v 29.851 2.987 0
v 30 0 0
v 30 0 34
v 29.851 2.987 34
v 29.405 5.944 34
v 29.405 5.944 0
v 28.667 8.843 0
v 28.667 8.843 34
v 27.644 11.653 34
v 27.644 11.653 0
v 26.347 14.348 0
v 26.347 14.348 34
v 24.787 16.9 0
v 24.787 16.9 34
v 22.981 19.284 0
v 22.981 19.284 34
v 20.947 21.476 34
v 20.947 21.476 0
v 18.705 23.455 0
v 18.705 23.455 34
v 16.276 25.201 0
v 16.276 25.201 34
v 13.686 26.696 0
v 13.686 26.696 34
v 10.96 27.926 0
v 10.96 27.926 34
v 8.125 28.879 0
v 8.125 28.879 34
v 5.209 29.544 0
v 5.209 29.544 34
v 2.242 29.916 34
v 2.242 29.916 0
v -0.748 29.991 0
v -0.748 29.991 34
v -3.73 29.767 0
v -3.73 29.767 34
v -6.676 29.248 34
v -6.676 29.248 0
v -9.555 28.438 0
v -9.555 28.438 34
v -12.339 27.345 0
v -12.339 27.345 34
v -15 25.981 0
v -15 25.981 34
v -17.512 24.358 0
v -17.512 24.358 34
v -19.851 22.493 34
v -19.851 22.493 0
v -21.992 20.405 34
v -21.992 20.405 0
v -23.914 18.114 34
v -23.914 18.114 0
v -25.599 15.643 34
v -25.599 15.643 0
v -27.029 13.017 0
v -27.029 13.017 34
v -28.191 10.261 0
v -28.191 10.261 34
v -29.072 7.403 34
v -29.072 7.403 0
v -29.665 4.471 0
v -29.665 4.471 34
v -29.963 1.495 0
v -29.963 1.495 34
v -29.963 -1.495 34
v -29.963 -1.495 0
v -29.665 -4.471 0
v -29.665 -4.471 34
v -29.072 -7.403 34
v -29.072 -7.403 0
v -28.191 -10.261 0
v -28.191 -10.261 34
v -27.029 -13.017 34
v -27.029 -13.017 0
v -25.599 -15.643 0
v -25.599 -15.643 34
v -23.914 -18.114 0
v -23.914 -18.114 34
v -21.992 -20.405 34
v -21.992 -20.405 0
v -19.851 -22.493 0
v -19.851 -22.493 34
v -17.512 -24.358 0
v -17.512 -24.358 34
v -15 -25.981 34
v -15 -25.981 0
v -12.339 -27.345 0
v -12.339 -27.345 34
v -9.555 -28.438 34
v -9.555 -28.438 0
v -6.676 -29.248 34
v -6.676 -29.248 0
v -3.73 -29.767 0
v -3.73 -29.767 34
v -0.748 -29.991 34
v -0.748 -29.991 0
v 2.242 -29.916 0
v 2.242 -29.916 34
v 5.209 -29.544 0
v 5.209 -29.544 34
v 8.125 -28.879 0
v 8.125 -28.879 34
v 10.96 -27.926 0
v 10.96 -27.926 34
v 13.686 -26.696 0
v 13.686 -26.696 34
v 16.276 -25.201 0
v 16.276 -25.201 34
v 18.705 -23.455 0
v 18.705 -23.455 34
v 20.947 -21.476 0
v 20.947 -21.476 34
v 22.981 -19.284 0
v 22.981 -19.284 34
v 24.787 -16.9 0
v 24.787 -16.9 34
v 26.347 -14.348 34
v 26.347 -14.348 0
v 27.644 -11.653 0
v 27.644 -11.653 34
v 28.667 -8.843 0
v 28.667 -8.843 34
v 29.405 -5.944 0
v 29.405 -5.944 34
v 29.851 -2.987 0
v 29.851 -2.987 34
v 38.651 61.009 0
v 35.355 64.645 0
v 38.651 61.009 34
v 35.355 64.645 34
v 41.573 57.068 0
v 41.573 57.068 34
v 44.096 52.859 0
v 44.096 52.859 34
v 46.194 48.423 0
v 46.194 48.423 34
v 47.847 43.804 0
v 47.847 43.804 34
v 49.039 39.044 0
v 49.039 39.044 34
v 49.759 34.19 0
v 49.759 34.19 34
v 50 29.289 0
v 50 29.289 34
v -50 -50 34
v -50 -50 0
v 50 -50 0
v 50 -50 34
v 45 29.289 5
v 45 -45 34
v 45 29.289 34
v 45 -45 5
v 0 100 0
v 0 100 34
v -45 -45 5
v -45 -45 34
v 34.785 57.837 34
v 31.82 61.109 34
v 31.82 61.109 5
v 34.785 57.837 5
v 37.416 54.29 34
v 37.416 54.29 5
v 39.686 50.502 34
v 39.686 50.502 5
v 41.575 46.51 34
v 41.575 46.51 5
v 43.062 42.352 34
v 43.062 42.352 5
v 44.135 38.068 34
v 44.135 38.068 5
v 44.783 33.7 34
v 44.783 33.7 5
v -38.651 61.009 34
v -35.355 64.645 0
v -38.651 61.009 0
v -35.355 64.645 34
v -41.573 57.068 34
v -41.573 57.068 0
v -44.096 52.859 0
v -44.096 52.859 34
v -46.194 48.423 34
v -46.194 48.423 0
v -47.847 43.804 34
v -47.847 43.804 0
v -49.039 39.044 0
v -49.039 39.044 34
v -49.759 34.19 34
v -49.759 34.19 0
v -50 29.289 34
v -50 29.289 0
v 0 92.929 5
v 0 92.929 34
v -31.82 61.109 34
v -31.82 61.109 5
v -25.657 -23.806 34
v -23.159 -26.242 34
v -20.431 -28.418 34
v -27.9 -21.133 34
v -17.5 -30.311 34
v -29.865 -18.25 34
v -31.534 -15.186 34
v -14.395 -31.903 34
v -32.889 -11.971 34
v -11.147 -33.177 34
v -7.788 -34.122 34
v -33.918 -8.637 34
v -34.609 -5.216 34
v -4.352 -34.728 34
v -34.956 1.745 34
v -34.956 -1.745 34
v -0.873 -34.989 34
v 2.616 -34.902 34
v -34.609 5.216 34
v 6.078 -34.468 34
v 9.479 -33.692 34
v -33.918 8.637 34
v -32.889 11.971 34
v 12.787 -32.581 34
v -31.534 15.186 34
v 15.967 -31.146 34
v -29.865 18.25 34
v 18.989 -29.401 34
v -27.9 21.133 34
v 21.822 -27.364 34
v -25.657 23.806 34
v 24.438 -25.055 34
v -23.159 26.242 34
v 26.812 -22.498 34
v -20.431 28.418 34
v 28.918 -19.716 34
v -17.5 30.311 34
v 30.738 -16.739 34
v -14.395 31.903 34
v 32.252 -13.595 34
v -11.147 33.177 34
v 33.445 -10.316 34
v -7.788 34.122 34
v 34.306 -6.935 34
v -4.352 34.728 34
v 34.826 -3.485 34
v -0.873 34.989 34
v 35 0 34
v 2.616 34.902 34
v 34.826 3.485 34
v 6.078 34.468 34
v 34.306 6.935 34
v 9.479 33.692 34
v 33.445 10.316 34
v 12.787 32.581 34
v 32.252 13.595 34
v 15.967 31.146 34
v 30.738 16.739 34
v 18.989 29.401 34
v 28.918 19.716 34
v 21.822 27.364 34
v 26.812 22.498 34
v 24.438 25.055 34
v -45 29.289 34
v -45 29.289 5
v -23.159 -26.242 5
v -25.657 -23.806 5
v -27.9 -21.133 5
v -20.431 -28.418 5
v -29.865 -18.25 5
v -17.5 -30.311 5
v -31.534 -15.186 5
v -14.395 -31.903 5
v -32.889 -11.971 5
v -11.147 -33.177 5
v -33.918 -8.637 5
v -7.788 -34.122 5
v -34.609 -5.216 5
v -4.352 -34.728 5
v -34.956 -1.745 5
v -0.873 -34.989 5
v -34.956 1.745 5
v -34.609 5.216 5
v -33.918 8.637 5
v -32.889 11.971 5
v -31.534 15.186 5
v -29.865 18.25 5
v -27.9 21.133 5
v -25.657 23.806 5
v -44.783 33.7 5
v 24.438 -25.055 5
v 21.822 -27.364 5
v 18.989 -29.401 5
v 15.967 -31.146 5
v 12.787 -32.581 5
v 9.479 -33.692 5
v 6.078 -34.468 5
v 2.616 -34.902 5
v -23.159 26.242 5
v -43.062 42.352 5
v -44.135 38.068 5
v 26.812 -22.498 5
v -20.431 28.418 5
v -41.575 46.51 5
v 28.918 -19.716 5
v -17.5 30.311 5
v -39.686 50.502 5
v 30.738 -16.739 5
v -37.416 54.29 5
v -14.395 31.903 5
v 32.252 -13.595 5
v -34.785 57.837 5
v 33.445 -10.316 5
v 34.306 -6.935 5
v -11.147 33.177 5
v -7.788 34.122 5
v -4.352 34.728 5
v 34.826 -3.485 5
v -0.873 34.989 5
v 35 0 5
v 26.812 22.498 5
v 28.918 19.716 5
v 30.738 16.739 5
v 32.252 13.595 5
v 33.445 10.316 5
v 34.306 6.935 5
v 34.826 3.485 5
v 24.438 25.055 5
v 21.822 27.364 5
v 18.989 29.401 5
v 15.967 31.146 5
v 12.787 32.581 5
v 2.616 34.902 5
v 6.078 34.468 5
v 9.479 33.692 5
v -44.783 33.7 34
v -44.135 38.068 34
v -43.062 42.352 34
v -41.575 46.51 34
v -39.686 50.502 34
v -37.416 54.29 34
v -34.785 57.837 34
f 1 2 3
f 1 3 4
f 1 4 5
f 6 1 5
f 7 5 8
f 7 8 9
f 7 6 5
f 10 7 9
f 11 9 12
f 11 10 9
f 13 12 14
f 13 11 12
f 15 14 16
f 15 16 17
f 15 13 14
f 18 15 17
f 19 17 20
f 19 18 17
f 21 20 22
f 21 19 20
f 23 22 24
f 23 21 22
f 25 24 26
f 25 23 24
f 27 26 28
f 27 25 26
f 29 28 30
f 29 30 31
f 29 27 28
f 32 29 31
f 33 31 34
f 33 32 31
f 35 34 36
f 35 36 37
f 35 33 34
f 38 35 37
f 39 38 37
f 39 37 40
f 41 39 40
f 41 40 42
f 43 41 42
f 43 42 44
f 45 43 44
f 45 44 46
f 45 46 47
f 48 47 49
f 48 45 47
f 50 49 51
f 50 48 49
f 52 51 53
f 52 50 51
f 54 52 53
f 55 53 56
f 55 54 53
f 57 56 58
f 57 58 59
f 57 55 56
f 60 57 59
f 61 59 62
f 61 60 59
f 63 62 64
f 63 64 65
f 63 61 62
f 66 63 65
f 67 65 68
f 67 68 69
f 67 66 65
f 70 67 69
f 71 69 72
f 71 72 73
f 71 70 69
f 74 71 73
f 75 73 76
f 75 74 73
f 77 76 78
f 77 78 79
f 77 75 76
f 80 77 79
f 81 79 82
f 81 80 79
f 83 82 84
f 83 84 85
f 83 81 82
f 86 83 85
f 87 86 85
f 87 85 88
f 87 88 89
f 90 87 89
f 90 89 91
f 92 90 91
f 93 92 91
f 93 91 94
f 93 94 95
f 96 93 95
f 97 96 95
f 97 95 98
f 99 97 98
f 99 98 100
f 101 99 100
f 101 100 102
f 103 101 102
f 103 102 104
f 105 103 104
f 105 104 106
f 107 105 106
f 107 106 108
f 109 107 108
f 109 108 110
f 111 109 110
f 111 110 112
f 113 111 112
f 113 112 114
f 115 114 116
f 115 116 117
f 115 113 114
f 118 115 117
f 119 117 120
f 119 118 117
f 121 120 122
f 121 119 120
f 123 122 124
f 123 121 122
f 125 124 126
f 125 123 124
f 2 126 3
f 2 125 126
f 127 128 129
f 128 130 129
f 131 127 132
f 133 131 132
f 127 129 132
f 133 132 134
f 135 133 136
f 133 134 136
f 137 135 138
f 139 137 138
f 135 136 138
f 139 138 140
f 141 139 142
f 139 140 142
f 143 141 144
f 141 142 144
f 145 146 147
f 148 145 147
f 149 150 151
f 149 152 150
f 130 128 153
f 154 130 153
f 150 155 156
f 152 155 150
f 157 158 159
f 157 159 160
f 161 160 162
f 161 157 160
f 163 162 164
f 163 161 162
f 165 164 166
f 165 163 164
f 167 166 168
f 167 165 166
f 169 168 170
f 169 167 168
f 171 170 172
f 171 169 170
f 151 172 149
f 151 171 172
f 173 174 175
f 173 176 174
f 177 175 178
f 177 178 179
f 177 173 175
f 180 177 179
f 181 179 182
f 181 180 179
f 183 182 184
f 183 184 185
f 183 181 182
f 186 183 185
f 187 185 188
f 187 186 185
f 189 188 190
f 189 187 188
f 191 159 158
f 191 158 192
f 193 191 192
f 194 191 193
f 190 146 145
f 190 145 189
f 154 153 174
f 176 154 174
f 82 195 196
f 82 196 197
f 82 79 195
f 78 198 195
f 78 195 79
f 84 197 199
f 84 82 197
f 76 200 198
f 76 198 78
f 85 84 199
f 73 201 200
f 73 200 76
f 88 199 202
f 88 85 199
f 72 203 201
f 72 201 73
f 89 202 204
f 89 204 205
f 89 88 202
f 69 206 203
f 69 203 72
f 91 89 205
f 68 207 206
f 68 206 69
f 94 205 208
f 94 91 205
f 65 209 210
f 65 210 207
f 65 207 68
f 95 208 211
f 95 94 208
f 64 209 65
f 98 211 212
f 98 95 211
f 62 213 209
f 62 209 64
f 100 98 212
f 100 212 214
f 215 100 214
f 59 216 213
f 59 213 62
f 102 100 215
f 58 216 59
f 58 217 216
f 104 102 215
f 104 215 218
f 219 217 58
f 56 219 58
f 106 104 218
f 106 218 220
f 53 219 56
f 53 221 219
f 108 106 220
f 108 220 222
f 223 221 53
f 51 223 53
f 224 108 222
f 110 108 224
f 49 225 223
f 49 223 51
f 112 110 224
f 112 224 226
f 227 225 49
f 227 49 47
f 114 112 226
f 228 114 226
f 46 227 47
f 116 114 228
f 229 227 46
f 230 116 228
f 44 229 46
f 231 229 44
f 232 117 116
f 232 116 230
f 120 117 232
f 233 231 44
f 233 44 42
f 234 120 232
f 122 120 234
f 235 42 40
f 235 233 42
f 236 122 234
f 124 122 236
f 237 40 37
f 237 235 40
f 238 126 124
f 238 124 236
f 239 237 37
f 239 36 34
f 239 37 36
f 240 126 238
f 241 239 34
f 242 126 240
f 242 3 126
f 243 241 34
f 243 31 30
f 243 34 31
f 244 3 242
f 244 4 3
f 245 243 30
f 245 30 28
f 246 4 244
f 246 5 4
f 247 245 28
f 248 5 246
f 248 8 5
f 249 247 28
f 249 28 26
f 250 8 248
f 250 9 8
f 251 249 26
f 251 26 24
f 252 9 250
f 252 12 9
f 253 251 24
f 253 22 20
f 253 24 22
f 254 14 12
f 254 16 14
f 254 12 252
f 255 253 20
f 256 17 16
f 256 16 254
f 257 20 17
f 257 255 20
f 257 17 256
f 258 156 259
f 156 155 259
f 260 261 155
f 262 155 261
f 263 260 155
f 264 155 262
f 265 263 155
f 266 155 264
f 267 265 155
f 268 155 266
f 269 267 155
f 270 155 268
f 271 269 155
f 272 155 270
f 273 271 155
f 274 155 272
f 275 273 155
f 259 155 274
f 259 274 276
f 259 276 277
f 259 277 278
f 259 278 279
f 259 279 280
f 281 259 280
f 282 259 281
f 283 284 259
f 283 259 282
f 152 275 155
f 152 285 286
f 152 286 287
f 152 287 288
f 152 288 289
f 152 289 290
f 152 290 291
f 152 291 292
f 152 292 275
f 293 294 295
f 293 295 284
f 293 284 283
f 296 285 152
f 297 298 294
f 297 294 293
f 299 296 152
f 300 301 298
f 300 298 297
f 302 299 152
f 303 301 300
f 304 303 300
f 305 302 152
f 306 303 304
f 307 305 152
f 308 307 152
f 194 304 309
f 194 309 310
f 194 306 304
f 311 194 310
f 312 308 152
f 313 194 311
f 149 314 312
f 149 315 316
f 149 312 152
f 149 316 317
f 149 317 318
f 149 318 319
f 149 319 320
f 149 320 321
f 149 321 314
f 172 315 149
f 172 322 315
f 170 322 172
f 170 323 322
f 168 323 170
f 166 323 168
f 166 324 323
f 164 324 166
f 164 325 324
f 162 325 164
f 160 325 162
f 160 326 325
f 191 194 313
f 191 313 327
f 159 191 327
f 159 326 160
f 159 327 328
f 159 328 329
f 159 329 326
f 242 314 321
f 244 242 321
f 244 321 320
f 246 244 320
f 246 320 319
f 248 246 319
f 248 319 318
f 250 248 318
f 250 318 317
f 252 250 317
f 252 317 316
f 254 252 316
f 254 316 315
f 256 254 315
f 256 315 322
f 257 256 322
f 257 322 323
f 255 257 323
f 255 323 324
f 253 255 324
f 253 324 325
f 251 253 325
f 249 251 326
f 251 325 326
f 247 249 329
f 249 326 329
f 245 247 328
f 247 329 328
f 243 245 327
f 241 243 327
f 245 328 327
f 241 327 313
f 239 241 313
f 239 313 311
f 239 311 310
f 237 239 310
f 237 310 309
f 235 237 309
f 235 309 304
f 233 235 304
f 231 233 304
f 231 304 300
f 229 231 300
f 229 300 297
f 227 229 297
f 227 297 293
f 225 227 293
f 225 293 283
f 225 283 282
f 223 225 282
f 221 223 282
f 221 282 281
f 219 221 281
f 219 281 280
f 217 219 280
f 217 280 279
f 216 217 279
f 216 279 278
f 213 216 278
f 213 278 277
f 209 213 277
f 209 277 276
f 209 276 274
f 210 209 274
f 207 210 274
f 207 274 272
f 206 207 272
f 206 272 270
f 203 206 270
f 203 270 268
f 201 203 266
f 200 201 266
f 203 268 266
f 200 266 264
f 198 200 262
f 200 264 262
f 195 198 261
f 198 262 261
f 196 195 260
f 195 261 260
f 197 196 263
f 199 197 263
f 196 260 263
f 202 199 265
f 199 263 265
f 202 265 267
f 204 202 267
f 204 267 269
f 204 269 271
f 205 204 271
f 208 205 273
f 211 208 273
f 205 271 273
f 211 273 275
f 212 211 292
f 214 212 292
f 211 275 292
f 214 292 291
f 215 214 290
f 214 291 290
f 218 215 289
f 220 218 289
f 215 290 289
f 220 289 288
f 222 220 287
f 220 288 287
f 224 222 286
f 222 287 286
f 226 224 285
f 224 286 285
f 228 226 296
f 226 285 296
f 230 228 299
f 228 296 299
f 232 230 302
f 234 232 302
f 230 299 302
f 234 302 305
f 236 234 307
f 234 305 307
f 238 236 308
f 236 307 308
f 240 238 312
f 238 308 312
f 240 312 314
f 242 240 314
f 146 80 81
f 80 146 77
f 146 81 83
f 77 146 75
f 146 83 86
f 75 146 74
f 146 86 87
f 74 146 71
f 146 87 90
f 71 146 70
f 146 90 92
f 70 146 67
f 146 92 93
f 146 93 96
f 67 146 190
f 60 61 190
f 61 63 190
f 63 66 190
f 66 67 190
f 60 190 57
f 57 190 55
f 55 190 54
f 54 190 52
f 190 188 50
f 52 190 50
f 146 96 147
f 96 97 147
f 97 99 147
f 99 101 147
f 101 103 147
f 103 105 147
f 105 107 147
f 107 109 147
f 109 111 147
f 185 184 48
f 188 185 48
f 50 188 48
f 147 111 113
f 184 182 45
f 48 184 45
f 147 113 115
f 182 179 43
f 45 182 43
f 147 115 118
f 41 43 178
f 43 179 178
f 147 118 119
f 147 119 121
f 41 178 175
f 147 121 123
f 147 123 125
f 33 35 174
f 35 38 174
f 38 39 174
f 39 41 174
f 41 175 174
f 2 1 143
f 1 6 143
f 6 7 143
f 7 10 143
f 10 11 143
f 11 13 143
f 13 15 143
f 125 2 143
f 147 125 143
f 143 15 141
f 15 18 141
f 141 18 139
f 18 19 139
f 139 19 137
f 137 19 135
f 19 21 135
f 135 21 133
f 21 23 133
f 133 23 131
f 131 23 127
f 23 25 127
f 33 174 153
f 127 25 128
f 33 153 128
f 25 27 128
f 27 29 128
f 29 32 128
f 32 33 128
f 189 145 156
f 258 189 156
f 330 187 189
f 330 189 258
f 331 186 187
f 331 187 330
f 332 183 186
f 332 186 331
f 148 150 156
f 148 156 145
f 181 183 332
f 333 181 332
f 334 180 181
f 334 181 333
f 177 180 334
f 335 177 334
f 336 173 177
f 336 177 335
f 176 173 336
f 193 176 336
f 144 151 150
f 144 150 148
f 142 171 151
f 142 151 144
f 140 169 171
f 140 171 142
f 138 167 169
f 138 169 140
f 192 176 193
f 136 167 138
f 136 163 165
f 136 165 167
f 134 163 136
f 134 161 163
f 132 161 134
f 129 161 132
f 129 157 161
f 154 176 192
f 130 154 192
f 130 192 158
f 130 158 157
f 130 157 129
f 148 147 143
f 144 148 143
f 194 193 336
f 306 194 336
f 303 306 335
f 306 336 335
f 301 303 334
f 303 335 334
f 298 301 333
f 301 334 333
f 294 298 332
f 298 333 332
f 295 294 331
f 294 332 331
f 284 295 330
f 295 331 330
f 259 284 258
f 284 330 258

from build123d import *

# Parameters (mm, degrees)
F0_W     = 100
F0_H     = 100
F0_R     = 30
F1_DEPTH = 34
F2_R     = 50
F3_T     = -5


with BuildPart() as f1:
    # F0 (on Top) → F1 (new body)
    with BuildSketch(Plane.XY):
        Polygon((0, 100), (-50, 50), (50, 50), align=None)
        Rectangle(F0_W, F0_H)
        Circle(F0_R, mode=Mode.SUBTRACT)
    extrude(amount=F1_DEPTH)

    # F2
    f2_edges = [f1.edges().sort_by_distance(p)[0] for p in [
        (-50, 50, 17),
        (50, 50, 17),
    ]]
    fillet(f2_edges, radius=F2_R)

    # F3
    f3_openings = [f1.faces().sort_by_distance(p)[0] for p in [
        (-16.402915, 81.047576, 34),
    ]]
    offset(amount=F3_T, openings=f3_openings)


solid = f1.part
